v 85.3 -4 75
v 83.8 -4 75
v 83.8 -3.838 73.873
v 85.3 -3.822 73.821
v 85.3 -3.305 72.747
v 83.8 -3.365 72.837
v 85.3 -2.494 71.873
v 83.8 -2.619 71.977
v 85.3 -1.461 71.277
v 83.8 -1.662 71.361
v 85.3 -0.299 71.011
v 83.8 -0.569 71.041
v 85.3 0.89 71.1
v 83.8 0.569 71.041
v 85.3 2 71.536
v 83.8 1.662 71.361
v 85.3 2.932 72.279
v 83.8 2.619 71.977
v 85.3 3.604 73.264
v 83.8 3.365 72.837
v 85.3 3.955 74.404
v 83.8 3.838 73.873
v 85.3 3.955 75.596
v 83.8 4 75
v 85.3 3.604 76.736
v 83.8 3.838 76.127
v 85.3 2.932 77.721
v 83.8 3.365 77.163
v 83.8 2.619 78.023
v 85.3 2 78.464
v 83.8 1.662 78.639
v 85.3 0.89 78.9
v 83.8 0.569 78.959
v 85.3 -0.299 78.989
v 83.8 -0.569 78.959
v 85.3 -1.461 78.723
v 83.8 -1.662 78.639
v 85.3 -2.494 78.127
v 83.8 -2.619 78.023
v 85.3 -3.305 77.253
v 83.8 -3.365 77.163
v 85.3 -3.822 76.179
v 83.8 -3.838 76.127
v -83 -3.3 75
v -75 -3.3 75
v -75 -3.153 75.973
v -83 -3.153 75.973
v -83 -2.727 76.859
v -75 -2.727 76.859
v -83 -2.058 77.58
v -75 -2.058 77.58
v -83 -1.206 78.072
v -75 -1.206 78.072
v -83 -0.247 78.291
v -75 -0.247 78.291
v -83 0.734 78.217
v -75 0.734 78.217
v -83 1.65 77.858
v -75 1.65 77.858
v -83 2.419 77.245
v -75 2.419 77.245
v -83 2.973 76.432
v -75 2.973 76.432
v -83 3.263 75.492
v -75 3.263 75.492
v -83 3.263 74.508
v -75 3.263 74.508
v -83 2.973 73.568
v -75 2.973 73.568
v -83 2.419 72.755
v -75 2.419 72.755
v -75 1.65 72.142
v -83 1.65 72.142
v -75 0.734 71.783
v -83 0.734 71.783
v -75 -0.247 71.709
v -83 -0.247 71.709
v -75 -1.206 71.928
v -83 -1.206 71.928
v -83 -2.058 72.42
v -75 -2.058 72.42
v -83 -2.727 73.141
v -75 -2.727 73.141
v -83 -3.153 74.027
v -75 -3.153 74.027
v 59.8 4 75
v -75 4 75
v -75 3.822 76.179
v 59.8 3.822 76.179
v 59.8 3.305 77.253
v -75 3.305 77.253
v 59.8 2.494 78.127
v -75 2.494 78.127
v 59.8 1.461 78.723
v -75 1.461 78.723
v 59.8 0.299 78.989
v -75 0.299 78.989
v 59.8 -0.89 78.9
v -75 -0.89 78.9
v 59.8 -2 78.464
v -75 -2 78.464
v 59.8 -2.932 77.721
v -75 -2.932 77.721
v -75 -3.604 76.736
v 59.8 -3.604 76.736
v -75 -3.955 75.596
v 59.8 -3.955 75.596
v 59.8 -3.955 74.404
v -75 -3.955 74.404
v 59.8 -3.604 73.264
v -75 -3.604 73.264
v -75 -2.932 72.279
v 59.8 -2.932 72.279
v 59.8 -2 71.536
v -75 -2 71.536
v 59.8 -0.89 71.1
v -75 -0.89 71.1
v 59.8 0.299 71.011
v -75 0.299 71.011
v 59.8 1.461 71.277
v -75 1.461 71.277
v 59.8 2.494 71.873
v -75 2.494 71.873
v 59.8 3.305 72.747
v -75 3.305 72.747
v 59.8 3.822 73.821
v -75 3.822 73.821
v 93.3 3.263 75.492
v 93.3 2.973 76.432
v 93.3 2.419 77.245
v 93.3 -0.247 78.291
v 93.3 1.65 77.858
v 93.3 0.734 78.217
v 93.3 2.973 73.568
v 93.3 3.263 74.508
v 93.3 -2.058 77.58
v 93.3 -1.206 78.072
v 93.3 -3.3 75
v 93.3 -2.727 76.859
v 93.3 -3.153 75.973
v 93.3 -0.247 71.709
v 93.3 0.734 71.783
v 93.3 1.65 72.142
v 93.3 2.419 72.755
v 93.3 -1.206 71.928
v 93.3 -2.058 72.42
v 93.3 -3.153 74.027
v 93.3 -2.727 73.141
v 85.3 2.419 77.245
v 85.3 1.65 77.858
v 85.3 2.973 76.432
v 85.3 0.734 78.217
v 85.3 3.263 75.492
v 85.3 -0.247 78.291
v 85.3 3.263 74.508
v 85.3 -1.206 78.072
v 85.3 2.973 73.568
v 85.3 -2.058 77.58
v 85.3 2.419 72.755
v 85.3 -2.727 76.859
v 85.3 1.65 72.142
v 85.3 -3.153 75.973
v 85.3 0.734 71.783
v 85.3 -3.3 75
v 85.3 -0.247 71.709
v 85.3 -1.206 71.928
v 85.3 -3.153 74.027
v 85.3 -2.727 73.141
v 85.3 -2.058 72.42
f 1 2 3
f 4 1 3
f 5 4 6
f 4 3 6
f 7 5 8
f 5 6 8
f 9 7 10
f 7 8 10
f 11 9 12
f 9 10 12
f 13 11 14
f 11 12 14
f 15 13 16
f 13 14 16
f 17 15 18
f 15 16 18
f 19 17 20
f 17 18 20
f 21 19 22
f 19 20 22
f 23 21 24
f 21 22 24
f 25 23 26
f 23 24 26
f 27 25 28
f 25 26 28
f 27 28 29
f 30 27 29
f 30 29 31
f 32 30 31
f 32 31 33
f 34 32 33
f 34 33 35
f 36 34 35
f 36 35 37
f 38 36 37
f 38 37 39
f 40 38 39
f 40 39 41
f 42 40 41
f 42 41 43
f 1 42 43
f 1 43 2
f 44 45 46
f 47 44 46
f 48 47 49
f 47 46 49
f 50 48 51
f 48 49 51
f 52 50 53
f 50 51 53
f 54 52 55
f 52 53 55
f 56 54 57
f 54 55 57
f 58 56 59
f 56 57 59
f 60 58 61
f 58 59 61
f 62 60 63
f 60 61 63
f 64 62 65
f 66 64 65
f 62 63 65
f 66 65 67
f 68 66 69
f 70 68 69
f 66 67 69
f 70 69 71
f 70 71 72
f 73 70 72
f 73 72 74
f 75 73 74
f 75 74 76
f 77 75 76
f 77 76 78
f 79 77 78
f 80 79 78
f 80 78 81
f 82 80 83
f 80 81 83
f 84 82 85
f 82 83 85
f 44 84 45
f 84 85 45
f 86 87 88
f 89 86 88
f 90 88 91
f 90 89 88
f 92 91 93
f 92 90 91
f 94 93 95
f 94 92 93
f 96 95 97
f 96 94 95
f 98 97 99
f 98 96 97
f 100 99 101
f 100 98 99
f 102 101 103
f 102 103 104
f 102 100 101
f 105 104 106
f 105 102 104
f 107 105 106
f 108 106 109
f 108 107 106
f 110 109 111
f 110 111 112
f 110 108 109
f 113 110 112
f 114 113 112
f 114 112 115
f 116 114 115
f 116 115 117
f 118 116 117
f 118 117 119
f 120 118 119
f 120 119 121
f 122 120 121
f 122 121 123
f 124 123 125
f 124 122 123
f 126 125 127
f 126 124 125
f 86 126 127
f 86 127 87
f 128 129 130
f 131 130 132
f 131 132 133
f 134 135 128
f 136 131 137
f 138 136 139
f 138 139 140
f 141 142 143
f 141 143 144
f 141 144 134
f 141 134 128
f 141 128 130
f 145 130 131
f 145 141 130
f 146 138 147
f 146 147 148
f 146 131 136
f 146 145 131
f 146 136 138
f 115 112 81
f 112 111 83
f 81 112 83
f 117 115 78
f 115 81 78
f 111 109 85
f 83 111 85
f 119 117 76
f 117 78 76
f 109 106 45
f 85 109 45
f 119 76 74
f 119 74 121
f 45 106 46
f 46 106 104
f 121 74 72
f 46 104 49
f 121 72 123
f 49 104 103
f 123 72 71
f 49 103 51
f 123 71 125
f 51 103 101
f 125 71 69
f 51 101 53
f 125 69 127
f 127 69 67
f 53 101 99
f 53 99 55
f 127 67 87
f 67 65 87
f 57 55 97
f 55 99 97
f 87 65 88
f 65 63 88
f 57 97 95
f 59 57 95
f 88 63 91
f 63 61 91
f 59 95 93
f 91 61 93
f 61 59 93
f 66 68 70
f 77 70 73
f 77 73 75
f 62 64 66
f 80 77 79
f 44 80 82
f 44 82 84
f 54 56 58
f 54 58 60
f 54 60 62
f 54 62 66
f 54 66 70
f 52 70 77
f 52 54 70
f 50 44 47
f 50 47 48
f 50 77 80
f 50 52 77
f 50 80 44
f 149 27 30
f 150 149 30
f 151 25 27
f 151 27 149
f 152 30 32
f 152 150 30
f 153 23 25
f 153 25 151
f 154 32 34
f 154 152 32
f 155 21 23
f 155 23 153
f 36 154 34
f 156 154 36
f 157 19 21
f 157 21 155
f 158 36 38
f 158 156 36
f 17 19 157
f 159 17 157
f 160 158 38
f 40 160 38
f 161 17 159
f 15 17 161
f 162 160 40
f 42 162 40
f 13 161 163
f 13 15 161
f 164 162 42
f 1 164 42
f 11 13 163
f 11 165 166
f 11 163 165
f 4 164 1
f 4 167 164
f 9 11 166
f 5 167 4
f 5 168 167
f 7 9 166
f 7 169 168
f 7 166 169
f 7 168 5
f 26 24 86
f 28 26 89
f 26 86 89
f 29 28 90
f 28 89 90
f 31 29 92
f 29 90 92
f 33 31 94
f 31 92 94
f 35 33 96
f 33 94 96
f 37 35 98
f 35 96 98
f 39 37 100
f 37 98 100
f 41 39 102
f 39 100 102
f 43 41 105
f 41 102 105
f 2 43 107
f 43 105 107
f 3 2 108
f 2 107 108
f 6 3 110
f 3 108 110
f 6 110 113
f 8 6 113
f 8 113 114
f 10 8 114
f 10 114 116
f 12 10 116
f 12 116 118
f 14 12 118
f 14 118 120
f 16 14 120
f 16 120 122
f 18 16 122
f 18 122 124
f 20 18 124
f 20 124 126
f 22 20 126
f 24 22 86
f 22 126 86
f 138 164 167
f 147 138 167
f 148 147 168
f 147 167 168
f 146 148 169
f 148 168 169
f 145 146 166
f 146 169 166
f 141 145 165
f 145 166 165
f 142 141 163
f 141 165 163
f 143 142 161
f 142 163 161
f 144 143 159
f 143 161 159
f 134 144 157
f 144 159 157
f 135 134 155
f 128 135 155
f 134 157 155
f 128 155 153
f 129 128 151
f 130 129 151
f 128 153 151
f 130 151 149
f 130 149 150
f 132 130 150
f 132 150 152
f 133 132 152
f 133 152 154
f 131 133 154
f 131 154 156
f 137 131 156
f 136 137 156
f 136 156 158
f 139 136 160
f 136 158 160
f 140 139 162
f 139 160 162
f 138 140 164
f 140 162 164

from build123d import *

# Parameters (mm, degrees)
SKETCH053_R         = 4
PAD024_DEPTH        = 134.8
SKETCH063_R         = 3.3
PAD028_DEPTH        = 8
SKETCH064_R         = 4
PAD029_DEPTH        = 50
CYLINDER001_R       = 100
CYLINDER001_DEPTH   = 100
CYLINDER001_FACE6_R = 4
PAD032_DEPTH        = 1.5
CYLINDER002_R       = 3.3
CYLINDER002_DEPTH   = 8


with BuildPart() as part:
    # Sketch053 (on Face1 of ShapeBinder012) → Pad024 (new body)
    with BuildSketch(Plane.YZ.offset(59.8)):
        with Locations((0, 75)):
            Circle(SKETCH053_R)
    extrude(amount=-PAD024_DEPTH)

    # Sketch063 (on Face3 of Pad024) → Pad028 (join)
    with BuildSketch(Plane(origin=(-75, 0, 0), x_dir=(0, -1, 0), z_dir=(-1, 0, 0))):
        with Locations((0, 75)):
            Circle(SKETCH063_R)
    extrude(amount=PAD028_DEPTH)

    # Sketch064 (on Face2 of Pad028) → Pad029 (join)
    with BuildSketch(Plane.YZ.offset(59.8)):
        with Locations((0, 75)):
            Circle(SKETCH064_R)
    extrude(amount=PAD029_DEPTH)

    # Cylinder001 → Cylinder001 (cut)
    with BuildSketch(Plane(origin=(83.8, 0, 75), x_dir=(0, -1, 0), z_dir=(1, 0, 0))):
        Circle(CYLINDER001_R)
    extrude(amount=CYLINDER001_DEPTH, mode=Mode.SUBTRACT)

    # Cylinder001 Face6 → Pad032 (add)
    with BuildSketch(Plane(origin=(83.8, 0, 75), x_dir=(0, -1, 0), z_dir=(1, 0, 0))):
        Circle(CYLINDER001_FACE6_R)
    extrude(amount=PAD032_DEPTH)

    # Cylinder002 → Cylinder002 (join)
    with BuildSketch(Plane(origin=(85.3, 0, 75), x_dir=(0, -1, 0), z_dir=(1, 0, 0))):
        Circle(CYLINDER002_R)
    extrude(amount=CYLINDER002_DEPTH)


solid = part.part
